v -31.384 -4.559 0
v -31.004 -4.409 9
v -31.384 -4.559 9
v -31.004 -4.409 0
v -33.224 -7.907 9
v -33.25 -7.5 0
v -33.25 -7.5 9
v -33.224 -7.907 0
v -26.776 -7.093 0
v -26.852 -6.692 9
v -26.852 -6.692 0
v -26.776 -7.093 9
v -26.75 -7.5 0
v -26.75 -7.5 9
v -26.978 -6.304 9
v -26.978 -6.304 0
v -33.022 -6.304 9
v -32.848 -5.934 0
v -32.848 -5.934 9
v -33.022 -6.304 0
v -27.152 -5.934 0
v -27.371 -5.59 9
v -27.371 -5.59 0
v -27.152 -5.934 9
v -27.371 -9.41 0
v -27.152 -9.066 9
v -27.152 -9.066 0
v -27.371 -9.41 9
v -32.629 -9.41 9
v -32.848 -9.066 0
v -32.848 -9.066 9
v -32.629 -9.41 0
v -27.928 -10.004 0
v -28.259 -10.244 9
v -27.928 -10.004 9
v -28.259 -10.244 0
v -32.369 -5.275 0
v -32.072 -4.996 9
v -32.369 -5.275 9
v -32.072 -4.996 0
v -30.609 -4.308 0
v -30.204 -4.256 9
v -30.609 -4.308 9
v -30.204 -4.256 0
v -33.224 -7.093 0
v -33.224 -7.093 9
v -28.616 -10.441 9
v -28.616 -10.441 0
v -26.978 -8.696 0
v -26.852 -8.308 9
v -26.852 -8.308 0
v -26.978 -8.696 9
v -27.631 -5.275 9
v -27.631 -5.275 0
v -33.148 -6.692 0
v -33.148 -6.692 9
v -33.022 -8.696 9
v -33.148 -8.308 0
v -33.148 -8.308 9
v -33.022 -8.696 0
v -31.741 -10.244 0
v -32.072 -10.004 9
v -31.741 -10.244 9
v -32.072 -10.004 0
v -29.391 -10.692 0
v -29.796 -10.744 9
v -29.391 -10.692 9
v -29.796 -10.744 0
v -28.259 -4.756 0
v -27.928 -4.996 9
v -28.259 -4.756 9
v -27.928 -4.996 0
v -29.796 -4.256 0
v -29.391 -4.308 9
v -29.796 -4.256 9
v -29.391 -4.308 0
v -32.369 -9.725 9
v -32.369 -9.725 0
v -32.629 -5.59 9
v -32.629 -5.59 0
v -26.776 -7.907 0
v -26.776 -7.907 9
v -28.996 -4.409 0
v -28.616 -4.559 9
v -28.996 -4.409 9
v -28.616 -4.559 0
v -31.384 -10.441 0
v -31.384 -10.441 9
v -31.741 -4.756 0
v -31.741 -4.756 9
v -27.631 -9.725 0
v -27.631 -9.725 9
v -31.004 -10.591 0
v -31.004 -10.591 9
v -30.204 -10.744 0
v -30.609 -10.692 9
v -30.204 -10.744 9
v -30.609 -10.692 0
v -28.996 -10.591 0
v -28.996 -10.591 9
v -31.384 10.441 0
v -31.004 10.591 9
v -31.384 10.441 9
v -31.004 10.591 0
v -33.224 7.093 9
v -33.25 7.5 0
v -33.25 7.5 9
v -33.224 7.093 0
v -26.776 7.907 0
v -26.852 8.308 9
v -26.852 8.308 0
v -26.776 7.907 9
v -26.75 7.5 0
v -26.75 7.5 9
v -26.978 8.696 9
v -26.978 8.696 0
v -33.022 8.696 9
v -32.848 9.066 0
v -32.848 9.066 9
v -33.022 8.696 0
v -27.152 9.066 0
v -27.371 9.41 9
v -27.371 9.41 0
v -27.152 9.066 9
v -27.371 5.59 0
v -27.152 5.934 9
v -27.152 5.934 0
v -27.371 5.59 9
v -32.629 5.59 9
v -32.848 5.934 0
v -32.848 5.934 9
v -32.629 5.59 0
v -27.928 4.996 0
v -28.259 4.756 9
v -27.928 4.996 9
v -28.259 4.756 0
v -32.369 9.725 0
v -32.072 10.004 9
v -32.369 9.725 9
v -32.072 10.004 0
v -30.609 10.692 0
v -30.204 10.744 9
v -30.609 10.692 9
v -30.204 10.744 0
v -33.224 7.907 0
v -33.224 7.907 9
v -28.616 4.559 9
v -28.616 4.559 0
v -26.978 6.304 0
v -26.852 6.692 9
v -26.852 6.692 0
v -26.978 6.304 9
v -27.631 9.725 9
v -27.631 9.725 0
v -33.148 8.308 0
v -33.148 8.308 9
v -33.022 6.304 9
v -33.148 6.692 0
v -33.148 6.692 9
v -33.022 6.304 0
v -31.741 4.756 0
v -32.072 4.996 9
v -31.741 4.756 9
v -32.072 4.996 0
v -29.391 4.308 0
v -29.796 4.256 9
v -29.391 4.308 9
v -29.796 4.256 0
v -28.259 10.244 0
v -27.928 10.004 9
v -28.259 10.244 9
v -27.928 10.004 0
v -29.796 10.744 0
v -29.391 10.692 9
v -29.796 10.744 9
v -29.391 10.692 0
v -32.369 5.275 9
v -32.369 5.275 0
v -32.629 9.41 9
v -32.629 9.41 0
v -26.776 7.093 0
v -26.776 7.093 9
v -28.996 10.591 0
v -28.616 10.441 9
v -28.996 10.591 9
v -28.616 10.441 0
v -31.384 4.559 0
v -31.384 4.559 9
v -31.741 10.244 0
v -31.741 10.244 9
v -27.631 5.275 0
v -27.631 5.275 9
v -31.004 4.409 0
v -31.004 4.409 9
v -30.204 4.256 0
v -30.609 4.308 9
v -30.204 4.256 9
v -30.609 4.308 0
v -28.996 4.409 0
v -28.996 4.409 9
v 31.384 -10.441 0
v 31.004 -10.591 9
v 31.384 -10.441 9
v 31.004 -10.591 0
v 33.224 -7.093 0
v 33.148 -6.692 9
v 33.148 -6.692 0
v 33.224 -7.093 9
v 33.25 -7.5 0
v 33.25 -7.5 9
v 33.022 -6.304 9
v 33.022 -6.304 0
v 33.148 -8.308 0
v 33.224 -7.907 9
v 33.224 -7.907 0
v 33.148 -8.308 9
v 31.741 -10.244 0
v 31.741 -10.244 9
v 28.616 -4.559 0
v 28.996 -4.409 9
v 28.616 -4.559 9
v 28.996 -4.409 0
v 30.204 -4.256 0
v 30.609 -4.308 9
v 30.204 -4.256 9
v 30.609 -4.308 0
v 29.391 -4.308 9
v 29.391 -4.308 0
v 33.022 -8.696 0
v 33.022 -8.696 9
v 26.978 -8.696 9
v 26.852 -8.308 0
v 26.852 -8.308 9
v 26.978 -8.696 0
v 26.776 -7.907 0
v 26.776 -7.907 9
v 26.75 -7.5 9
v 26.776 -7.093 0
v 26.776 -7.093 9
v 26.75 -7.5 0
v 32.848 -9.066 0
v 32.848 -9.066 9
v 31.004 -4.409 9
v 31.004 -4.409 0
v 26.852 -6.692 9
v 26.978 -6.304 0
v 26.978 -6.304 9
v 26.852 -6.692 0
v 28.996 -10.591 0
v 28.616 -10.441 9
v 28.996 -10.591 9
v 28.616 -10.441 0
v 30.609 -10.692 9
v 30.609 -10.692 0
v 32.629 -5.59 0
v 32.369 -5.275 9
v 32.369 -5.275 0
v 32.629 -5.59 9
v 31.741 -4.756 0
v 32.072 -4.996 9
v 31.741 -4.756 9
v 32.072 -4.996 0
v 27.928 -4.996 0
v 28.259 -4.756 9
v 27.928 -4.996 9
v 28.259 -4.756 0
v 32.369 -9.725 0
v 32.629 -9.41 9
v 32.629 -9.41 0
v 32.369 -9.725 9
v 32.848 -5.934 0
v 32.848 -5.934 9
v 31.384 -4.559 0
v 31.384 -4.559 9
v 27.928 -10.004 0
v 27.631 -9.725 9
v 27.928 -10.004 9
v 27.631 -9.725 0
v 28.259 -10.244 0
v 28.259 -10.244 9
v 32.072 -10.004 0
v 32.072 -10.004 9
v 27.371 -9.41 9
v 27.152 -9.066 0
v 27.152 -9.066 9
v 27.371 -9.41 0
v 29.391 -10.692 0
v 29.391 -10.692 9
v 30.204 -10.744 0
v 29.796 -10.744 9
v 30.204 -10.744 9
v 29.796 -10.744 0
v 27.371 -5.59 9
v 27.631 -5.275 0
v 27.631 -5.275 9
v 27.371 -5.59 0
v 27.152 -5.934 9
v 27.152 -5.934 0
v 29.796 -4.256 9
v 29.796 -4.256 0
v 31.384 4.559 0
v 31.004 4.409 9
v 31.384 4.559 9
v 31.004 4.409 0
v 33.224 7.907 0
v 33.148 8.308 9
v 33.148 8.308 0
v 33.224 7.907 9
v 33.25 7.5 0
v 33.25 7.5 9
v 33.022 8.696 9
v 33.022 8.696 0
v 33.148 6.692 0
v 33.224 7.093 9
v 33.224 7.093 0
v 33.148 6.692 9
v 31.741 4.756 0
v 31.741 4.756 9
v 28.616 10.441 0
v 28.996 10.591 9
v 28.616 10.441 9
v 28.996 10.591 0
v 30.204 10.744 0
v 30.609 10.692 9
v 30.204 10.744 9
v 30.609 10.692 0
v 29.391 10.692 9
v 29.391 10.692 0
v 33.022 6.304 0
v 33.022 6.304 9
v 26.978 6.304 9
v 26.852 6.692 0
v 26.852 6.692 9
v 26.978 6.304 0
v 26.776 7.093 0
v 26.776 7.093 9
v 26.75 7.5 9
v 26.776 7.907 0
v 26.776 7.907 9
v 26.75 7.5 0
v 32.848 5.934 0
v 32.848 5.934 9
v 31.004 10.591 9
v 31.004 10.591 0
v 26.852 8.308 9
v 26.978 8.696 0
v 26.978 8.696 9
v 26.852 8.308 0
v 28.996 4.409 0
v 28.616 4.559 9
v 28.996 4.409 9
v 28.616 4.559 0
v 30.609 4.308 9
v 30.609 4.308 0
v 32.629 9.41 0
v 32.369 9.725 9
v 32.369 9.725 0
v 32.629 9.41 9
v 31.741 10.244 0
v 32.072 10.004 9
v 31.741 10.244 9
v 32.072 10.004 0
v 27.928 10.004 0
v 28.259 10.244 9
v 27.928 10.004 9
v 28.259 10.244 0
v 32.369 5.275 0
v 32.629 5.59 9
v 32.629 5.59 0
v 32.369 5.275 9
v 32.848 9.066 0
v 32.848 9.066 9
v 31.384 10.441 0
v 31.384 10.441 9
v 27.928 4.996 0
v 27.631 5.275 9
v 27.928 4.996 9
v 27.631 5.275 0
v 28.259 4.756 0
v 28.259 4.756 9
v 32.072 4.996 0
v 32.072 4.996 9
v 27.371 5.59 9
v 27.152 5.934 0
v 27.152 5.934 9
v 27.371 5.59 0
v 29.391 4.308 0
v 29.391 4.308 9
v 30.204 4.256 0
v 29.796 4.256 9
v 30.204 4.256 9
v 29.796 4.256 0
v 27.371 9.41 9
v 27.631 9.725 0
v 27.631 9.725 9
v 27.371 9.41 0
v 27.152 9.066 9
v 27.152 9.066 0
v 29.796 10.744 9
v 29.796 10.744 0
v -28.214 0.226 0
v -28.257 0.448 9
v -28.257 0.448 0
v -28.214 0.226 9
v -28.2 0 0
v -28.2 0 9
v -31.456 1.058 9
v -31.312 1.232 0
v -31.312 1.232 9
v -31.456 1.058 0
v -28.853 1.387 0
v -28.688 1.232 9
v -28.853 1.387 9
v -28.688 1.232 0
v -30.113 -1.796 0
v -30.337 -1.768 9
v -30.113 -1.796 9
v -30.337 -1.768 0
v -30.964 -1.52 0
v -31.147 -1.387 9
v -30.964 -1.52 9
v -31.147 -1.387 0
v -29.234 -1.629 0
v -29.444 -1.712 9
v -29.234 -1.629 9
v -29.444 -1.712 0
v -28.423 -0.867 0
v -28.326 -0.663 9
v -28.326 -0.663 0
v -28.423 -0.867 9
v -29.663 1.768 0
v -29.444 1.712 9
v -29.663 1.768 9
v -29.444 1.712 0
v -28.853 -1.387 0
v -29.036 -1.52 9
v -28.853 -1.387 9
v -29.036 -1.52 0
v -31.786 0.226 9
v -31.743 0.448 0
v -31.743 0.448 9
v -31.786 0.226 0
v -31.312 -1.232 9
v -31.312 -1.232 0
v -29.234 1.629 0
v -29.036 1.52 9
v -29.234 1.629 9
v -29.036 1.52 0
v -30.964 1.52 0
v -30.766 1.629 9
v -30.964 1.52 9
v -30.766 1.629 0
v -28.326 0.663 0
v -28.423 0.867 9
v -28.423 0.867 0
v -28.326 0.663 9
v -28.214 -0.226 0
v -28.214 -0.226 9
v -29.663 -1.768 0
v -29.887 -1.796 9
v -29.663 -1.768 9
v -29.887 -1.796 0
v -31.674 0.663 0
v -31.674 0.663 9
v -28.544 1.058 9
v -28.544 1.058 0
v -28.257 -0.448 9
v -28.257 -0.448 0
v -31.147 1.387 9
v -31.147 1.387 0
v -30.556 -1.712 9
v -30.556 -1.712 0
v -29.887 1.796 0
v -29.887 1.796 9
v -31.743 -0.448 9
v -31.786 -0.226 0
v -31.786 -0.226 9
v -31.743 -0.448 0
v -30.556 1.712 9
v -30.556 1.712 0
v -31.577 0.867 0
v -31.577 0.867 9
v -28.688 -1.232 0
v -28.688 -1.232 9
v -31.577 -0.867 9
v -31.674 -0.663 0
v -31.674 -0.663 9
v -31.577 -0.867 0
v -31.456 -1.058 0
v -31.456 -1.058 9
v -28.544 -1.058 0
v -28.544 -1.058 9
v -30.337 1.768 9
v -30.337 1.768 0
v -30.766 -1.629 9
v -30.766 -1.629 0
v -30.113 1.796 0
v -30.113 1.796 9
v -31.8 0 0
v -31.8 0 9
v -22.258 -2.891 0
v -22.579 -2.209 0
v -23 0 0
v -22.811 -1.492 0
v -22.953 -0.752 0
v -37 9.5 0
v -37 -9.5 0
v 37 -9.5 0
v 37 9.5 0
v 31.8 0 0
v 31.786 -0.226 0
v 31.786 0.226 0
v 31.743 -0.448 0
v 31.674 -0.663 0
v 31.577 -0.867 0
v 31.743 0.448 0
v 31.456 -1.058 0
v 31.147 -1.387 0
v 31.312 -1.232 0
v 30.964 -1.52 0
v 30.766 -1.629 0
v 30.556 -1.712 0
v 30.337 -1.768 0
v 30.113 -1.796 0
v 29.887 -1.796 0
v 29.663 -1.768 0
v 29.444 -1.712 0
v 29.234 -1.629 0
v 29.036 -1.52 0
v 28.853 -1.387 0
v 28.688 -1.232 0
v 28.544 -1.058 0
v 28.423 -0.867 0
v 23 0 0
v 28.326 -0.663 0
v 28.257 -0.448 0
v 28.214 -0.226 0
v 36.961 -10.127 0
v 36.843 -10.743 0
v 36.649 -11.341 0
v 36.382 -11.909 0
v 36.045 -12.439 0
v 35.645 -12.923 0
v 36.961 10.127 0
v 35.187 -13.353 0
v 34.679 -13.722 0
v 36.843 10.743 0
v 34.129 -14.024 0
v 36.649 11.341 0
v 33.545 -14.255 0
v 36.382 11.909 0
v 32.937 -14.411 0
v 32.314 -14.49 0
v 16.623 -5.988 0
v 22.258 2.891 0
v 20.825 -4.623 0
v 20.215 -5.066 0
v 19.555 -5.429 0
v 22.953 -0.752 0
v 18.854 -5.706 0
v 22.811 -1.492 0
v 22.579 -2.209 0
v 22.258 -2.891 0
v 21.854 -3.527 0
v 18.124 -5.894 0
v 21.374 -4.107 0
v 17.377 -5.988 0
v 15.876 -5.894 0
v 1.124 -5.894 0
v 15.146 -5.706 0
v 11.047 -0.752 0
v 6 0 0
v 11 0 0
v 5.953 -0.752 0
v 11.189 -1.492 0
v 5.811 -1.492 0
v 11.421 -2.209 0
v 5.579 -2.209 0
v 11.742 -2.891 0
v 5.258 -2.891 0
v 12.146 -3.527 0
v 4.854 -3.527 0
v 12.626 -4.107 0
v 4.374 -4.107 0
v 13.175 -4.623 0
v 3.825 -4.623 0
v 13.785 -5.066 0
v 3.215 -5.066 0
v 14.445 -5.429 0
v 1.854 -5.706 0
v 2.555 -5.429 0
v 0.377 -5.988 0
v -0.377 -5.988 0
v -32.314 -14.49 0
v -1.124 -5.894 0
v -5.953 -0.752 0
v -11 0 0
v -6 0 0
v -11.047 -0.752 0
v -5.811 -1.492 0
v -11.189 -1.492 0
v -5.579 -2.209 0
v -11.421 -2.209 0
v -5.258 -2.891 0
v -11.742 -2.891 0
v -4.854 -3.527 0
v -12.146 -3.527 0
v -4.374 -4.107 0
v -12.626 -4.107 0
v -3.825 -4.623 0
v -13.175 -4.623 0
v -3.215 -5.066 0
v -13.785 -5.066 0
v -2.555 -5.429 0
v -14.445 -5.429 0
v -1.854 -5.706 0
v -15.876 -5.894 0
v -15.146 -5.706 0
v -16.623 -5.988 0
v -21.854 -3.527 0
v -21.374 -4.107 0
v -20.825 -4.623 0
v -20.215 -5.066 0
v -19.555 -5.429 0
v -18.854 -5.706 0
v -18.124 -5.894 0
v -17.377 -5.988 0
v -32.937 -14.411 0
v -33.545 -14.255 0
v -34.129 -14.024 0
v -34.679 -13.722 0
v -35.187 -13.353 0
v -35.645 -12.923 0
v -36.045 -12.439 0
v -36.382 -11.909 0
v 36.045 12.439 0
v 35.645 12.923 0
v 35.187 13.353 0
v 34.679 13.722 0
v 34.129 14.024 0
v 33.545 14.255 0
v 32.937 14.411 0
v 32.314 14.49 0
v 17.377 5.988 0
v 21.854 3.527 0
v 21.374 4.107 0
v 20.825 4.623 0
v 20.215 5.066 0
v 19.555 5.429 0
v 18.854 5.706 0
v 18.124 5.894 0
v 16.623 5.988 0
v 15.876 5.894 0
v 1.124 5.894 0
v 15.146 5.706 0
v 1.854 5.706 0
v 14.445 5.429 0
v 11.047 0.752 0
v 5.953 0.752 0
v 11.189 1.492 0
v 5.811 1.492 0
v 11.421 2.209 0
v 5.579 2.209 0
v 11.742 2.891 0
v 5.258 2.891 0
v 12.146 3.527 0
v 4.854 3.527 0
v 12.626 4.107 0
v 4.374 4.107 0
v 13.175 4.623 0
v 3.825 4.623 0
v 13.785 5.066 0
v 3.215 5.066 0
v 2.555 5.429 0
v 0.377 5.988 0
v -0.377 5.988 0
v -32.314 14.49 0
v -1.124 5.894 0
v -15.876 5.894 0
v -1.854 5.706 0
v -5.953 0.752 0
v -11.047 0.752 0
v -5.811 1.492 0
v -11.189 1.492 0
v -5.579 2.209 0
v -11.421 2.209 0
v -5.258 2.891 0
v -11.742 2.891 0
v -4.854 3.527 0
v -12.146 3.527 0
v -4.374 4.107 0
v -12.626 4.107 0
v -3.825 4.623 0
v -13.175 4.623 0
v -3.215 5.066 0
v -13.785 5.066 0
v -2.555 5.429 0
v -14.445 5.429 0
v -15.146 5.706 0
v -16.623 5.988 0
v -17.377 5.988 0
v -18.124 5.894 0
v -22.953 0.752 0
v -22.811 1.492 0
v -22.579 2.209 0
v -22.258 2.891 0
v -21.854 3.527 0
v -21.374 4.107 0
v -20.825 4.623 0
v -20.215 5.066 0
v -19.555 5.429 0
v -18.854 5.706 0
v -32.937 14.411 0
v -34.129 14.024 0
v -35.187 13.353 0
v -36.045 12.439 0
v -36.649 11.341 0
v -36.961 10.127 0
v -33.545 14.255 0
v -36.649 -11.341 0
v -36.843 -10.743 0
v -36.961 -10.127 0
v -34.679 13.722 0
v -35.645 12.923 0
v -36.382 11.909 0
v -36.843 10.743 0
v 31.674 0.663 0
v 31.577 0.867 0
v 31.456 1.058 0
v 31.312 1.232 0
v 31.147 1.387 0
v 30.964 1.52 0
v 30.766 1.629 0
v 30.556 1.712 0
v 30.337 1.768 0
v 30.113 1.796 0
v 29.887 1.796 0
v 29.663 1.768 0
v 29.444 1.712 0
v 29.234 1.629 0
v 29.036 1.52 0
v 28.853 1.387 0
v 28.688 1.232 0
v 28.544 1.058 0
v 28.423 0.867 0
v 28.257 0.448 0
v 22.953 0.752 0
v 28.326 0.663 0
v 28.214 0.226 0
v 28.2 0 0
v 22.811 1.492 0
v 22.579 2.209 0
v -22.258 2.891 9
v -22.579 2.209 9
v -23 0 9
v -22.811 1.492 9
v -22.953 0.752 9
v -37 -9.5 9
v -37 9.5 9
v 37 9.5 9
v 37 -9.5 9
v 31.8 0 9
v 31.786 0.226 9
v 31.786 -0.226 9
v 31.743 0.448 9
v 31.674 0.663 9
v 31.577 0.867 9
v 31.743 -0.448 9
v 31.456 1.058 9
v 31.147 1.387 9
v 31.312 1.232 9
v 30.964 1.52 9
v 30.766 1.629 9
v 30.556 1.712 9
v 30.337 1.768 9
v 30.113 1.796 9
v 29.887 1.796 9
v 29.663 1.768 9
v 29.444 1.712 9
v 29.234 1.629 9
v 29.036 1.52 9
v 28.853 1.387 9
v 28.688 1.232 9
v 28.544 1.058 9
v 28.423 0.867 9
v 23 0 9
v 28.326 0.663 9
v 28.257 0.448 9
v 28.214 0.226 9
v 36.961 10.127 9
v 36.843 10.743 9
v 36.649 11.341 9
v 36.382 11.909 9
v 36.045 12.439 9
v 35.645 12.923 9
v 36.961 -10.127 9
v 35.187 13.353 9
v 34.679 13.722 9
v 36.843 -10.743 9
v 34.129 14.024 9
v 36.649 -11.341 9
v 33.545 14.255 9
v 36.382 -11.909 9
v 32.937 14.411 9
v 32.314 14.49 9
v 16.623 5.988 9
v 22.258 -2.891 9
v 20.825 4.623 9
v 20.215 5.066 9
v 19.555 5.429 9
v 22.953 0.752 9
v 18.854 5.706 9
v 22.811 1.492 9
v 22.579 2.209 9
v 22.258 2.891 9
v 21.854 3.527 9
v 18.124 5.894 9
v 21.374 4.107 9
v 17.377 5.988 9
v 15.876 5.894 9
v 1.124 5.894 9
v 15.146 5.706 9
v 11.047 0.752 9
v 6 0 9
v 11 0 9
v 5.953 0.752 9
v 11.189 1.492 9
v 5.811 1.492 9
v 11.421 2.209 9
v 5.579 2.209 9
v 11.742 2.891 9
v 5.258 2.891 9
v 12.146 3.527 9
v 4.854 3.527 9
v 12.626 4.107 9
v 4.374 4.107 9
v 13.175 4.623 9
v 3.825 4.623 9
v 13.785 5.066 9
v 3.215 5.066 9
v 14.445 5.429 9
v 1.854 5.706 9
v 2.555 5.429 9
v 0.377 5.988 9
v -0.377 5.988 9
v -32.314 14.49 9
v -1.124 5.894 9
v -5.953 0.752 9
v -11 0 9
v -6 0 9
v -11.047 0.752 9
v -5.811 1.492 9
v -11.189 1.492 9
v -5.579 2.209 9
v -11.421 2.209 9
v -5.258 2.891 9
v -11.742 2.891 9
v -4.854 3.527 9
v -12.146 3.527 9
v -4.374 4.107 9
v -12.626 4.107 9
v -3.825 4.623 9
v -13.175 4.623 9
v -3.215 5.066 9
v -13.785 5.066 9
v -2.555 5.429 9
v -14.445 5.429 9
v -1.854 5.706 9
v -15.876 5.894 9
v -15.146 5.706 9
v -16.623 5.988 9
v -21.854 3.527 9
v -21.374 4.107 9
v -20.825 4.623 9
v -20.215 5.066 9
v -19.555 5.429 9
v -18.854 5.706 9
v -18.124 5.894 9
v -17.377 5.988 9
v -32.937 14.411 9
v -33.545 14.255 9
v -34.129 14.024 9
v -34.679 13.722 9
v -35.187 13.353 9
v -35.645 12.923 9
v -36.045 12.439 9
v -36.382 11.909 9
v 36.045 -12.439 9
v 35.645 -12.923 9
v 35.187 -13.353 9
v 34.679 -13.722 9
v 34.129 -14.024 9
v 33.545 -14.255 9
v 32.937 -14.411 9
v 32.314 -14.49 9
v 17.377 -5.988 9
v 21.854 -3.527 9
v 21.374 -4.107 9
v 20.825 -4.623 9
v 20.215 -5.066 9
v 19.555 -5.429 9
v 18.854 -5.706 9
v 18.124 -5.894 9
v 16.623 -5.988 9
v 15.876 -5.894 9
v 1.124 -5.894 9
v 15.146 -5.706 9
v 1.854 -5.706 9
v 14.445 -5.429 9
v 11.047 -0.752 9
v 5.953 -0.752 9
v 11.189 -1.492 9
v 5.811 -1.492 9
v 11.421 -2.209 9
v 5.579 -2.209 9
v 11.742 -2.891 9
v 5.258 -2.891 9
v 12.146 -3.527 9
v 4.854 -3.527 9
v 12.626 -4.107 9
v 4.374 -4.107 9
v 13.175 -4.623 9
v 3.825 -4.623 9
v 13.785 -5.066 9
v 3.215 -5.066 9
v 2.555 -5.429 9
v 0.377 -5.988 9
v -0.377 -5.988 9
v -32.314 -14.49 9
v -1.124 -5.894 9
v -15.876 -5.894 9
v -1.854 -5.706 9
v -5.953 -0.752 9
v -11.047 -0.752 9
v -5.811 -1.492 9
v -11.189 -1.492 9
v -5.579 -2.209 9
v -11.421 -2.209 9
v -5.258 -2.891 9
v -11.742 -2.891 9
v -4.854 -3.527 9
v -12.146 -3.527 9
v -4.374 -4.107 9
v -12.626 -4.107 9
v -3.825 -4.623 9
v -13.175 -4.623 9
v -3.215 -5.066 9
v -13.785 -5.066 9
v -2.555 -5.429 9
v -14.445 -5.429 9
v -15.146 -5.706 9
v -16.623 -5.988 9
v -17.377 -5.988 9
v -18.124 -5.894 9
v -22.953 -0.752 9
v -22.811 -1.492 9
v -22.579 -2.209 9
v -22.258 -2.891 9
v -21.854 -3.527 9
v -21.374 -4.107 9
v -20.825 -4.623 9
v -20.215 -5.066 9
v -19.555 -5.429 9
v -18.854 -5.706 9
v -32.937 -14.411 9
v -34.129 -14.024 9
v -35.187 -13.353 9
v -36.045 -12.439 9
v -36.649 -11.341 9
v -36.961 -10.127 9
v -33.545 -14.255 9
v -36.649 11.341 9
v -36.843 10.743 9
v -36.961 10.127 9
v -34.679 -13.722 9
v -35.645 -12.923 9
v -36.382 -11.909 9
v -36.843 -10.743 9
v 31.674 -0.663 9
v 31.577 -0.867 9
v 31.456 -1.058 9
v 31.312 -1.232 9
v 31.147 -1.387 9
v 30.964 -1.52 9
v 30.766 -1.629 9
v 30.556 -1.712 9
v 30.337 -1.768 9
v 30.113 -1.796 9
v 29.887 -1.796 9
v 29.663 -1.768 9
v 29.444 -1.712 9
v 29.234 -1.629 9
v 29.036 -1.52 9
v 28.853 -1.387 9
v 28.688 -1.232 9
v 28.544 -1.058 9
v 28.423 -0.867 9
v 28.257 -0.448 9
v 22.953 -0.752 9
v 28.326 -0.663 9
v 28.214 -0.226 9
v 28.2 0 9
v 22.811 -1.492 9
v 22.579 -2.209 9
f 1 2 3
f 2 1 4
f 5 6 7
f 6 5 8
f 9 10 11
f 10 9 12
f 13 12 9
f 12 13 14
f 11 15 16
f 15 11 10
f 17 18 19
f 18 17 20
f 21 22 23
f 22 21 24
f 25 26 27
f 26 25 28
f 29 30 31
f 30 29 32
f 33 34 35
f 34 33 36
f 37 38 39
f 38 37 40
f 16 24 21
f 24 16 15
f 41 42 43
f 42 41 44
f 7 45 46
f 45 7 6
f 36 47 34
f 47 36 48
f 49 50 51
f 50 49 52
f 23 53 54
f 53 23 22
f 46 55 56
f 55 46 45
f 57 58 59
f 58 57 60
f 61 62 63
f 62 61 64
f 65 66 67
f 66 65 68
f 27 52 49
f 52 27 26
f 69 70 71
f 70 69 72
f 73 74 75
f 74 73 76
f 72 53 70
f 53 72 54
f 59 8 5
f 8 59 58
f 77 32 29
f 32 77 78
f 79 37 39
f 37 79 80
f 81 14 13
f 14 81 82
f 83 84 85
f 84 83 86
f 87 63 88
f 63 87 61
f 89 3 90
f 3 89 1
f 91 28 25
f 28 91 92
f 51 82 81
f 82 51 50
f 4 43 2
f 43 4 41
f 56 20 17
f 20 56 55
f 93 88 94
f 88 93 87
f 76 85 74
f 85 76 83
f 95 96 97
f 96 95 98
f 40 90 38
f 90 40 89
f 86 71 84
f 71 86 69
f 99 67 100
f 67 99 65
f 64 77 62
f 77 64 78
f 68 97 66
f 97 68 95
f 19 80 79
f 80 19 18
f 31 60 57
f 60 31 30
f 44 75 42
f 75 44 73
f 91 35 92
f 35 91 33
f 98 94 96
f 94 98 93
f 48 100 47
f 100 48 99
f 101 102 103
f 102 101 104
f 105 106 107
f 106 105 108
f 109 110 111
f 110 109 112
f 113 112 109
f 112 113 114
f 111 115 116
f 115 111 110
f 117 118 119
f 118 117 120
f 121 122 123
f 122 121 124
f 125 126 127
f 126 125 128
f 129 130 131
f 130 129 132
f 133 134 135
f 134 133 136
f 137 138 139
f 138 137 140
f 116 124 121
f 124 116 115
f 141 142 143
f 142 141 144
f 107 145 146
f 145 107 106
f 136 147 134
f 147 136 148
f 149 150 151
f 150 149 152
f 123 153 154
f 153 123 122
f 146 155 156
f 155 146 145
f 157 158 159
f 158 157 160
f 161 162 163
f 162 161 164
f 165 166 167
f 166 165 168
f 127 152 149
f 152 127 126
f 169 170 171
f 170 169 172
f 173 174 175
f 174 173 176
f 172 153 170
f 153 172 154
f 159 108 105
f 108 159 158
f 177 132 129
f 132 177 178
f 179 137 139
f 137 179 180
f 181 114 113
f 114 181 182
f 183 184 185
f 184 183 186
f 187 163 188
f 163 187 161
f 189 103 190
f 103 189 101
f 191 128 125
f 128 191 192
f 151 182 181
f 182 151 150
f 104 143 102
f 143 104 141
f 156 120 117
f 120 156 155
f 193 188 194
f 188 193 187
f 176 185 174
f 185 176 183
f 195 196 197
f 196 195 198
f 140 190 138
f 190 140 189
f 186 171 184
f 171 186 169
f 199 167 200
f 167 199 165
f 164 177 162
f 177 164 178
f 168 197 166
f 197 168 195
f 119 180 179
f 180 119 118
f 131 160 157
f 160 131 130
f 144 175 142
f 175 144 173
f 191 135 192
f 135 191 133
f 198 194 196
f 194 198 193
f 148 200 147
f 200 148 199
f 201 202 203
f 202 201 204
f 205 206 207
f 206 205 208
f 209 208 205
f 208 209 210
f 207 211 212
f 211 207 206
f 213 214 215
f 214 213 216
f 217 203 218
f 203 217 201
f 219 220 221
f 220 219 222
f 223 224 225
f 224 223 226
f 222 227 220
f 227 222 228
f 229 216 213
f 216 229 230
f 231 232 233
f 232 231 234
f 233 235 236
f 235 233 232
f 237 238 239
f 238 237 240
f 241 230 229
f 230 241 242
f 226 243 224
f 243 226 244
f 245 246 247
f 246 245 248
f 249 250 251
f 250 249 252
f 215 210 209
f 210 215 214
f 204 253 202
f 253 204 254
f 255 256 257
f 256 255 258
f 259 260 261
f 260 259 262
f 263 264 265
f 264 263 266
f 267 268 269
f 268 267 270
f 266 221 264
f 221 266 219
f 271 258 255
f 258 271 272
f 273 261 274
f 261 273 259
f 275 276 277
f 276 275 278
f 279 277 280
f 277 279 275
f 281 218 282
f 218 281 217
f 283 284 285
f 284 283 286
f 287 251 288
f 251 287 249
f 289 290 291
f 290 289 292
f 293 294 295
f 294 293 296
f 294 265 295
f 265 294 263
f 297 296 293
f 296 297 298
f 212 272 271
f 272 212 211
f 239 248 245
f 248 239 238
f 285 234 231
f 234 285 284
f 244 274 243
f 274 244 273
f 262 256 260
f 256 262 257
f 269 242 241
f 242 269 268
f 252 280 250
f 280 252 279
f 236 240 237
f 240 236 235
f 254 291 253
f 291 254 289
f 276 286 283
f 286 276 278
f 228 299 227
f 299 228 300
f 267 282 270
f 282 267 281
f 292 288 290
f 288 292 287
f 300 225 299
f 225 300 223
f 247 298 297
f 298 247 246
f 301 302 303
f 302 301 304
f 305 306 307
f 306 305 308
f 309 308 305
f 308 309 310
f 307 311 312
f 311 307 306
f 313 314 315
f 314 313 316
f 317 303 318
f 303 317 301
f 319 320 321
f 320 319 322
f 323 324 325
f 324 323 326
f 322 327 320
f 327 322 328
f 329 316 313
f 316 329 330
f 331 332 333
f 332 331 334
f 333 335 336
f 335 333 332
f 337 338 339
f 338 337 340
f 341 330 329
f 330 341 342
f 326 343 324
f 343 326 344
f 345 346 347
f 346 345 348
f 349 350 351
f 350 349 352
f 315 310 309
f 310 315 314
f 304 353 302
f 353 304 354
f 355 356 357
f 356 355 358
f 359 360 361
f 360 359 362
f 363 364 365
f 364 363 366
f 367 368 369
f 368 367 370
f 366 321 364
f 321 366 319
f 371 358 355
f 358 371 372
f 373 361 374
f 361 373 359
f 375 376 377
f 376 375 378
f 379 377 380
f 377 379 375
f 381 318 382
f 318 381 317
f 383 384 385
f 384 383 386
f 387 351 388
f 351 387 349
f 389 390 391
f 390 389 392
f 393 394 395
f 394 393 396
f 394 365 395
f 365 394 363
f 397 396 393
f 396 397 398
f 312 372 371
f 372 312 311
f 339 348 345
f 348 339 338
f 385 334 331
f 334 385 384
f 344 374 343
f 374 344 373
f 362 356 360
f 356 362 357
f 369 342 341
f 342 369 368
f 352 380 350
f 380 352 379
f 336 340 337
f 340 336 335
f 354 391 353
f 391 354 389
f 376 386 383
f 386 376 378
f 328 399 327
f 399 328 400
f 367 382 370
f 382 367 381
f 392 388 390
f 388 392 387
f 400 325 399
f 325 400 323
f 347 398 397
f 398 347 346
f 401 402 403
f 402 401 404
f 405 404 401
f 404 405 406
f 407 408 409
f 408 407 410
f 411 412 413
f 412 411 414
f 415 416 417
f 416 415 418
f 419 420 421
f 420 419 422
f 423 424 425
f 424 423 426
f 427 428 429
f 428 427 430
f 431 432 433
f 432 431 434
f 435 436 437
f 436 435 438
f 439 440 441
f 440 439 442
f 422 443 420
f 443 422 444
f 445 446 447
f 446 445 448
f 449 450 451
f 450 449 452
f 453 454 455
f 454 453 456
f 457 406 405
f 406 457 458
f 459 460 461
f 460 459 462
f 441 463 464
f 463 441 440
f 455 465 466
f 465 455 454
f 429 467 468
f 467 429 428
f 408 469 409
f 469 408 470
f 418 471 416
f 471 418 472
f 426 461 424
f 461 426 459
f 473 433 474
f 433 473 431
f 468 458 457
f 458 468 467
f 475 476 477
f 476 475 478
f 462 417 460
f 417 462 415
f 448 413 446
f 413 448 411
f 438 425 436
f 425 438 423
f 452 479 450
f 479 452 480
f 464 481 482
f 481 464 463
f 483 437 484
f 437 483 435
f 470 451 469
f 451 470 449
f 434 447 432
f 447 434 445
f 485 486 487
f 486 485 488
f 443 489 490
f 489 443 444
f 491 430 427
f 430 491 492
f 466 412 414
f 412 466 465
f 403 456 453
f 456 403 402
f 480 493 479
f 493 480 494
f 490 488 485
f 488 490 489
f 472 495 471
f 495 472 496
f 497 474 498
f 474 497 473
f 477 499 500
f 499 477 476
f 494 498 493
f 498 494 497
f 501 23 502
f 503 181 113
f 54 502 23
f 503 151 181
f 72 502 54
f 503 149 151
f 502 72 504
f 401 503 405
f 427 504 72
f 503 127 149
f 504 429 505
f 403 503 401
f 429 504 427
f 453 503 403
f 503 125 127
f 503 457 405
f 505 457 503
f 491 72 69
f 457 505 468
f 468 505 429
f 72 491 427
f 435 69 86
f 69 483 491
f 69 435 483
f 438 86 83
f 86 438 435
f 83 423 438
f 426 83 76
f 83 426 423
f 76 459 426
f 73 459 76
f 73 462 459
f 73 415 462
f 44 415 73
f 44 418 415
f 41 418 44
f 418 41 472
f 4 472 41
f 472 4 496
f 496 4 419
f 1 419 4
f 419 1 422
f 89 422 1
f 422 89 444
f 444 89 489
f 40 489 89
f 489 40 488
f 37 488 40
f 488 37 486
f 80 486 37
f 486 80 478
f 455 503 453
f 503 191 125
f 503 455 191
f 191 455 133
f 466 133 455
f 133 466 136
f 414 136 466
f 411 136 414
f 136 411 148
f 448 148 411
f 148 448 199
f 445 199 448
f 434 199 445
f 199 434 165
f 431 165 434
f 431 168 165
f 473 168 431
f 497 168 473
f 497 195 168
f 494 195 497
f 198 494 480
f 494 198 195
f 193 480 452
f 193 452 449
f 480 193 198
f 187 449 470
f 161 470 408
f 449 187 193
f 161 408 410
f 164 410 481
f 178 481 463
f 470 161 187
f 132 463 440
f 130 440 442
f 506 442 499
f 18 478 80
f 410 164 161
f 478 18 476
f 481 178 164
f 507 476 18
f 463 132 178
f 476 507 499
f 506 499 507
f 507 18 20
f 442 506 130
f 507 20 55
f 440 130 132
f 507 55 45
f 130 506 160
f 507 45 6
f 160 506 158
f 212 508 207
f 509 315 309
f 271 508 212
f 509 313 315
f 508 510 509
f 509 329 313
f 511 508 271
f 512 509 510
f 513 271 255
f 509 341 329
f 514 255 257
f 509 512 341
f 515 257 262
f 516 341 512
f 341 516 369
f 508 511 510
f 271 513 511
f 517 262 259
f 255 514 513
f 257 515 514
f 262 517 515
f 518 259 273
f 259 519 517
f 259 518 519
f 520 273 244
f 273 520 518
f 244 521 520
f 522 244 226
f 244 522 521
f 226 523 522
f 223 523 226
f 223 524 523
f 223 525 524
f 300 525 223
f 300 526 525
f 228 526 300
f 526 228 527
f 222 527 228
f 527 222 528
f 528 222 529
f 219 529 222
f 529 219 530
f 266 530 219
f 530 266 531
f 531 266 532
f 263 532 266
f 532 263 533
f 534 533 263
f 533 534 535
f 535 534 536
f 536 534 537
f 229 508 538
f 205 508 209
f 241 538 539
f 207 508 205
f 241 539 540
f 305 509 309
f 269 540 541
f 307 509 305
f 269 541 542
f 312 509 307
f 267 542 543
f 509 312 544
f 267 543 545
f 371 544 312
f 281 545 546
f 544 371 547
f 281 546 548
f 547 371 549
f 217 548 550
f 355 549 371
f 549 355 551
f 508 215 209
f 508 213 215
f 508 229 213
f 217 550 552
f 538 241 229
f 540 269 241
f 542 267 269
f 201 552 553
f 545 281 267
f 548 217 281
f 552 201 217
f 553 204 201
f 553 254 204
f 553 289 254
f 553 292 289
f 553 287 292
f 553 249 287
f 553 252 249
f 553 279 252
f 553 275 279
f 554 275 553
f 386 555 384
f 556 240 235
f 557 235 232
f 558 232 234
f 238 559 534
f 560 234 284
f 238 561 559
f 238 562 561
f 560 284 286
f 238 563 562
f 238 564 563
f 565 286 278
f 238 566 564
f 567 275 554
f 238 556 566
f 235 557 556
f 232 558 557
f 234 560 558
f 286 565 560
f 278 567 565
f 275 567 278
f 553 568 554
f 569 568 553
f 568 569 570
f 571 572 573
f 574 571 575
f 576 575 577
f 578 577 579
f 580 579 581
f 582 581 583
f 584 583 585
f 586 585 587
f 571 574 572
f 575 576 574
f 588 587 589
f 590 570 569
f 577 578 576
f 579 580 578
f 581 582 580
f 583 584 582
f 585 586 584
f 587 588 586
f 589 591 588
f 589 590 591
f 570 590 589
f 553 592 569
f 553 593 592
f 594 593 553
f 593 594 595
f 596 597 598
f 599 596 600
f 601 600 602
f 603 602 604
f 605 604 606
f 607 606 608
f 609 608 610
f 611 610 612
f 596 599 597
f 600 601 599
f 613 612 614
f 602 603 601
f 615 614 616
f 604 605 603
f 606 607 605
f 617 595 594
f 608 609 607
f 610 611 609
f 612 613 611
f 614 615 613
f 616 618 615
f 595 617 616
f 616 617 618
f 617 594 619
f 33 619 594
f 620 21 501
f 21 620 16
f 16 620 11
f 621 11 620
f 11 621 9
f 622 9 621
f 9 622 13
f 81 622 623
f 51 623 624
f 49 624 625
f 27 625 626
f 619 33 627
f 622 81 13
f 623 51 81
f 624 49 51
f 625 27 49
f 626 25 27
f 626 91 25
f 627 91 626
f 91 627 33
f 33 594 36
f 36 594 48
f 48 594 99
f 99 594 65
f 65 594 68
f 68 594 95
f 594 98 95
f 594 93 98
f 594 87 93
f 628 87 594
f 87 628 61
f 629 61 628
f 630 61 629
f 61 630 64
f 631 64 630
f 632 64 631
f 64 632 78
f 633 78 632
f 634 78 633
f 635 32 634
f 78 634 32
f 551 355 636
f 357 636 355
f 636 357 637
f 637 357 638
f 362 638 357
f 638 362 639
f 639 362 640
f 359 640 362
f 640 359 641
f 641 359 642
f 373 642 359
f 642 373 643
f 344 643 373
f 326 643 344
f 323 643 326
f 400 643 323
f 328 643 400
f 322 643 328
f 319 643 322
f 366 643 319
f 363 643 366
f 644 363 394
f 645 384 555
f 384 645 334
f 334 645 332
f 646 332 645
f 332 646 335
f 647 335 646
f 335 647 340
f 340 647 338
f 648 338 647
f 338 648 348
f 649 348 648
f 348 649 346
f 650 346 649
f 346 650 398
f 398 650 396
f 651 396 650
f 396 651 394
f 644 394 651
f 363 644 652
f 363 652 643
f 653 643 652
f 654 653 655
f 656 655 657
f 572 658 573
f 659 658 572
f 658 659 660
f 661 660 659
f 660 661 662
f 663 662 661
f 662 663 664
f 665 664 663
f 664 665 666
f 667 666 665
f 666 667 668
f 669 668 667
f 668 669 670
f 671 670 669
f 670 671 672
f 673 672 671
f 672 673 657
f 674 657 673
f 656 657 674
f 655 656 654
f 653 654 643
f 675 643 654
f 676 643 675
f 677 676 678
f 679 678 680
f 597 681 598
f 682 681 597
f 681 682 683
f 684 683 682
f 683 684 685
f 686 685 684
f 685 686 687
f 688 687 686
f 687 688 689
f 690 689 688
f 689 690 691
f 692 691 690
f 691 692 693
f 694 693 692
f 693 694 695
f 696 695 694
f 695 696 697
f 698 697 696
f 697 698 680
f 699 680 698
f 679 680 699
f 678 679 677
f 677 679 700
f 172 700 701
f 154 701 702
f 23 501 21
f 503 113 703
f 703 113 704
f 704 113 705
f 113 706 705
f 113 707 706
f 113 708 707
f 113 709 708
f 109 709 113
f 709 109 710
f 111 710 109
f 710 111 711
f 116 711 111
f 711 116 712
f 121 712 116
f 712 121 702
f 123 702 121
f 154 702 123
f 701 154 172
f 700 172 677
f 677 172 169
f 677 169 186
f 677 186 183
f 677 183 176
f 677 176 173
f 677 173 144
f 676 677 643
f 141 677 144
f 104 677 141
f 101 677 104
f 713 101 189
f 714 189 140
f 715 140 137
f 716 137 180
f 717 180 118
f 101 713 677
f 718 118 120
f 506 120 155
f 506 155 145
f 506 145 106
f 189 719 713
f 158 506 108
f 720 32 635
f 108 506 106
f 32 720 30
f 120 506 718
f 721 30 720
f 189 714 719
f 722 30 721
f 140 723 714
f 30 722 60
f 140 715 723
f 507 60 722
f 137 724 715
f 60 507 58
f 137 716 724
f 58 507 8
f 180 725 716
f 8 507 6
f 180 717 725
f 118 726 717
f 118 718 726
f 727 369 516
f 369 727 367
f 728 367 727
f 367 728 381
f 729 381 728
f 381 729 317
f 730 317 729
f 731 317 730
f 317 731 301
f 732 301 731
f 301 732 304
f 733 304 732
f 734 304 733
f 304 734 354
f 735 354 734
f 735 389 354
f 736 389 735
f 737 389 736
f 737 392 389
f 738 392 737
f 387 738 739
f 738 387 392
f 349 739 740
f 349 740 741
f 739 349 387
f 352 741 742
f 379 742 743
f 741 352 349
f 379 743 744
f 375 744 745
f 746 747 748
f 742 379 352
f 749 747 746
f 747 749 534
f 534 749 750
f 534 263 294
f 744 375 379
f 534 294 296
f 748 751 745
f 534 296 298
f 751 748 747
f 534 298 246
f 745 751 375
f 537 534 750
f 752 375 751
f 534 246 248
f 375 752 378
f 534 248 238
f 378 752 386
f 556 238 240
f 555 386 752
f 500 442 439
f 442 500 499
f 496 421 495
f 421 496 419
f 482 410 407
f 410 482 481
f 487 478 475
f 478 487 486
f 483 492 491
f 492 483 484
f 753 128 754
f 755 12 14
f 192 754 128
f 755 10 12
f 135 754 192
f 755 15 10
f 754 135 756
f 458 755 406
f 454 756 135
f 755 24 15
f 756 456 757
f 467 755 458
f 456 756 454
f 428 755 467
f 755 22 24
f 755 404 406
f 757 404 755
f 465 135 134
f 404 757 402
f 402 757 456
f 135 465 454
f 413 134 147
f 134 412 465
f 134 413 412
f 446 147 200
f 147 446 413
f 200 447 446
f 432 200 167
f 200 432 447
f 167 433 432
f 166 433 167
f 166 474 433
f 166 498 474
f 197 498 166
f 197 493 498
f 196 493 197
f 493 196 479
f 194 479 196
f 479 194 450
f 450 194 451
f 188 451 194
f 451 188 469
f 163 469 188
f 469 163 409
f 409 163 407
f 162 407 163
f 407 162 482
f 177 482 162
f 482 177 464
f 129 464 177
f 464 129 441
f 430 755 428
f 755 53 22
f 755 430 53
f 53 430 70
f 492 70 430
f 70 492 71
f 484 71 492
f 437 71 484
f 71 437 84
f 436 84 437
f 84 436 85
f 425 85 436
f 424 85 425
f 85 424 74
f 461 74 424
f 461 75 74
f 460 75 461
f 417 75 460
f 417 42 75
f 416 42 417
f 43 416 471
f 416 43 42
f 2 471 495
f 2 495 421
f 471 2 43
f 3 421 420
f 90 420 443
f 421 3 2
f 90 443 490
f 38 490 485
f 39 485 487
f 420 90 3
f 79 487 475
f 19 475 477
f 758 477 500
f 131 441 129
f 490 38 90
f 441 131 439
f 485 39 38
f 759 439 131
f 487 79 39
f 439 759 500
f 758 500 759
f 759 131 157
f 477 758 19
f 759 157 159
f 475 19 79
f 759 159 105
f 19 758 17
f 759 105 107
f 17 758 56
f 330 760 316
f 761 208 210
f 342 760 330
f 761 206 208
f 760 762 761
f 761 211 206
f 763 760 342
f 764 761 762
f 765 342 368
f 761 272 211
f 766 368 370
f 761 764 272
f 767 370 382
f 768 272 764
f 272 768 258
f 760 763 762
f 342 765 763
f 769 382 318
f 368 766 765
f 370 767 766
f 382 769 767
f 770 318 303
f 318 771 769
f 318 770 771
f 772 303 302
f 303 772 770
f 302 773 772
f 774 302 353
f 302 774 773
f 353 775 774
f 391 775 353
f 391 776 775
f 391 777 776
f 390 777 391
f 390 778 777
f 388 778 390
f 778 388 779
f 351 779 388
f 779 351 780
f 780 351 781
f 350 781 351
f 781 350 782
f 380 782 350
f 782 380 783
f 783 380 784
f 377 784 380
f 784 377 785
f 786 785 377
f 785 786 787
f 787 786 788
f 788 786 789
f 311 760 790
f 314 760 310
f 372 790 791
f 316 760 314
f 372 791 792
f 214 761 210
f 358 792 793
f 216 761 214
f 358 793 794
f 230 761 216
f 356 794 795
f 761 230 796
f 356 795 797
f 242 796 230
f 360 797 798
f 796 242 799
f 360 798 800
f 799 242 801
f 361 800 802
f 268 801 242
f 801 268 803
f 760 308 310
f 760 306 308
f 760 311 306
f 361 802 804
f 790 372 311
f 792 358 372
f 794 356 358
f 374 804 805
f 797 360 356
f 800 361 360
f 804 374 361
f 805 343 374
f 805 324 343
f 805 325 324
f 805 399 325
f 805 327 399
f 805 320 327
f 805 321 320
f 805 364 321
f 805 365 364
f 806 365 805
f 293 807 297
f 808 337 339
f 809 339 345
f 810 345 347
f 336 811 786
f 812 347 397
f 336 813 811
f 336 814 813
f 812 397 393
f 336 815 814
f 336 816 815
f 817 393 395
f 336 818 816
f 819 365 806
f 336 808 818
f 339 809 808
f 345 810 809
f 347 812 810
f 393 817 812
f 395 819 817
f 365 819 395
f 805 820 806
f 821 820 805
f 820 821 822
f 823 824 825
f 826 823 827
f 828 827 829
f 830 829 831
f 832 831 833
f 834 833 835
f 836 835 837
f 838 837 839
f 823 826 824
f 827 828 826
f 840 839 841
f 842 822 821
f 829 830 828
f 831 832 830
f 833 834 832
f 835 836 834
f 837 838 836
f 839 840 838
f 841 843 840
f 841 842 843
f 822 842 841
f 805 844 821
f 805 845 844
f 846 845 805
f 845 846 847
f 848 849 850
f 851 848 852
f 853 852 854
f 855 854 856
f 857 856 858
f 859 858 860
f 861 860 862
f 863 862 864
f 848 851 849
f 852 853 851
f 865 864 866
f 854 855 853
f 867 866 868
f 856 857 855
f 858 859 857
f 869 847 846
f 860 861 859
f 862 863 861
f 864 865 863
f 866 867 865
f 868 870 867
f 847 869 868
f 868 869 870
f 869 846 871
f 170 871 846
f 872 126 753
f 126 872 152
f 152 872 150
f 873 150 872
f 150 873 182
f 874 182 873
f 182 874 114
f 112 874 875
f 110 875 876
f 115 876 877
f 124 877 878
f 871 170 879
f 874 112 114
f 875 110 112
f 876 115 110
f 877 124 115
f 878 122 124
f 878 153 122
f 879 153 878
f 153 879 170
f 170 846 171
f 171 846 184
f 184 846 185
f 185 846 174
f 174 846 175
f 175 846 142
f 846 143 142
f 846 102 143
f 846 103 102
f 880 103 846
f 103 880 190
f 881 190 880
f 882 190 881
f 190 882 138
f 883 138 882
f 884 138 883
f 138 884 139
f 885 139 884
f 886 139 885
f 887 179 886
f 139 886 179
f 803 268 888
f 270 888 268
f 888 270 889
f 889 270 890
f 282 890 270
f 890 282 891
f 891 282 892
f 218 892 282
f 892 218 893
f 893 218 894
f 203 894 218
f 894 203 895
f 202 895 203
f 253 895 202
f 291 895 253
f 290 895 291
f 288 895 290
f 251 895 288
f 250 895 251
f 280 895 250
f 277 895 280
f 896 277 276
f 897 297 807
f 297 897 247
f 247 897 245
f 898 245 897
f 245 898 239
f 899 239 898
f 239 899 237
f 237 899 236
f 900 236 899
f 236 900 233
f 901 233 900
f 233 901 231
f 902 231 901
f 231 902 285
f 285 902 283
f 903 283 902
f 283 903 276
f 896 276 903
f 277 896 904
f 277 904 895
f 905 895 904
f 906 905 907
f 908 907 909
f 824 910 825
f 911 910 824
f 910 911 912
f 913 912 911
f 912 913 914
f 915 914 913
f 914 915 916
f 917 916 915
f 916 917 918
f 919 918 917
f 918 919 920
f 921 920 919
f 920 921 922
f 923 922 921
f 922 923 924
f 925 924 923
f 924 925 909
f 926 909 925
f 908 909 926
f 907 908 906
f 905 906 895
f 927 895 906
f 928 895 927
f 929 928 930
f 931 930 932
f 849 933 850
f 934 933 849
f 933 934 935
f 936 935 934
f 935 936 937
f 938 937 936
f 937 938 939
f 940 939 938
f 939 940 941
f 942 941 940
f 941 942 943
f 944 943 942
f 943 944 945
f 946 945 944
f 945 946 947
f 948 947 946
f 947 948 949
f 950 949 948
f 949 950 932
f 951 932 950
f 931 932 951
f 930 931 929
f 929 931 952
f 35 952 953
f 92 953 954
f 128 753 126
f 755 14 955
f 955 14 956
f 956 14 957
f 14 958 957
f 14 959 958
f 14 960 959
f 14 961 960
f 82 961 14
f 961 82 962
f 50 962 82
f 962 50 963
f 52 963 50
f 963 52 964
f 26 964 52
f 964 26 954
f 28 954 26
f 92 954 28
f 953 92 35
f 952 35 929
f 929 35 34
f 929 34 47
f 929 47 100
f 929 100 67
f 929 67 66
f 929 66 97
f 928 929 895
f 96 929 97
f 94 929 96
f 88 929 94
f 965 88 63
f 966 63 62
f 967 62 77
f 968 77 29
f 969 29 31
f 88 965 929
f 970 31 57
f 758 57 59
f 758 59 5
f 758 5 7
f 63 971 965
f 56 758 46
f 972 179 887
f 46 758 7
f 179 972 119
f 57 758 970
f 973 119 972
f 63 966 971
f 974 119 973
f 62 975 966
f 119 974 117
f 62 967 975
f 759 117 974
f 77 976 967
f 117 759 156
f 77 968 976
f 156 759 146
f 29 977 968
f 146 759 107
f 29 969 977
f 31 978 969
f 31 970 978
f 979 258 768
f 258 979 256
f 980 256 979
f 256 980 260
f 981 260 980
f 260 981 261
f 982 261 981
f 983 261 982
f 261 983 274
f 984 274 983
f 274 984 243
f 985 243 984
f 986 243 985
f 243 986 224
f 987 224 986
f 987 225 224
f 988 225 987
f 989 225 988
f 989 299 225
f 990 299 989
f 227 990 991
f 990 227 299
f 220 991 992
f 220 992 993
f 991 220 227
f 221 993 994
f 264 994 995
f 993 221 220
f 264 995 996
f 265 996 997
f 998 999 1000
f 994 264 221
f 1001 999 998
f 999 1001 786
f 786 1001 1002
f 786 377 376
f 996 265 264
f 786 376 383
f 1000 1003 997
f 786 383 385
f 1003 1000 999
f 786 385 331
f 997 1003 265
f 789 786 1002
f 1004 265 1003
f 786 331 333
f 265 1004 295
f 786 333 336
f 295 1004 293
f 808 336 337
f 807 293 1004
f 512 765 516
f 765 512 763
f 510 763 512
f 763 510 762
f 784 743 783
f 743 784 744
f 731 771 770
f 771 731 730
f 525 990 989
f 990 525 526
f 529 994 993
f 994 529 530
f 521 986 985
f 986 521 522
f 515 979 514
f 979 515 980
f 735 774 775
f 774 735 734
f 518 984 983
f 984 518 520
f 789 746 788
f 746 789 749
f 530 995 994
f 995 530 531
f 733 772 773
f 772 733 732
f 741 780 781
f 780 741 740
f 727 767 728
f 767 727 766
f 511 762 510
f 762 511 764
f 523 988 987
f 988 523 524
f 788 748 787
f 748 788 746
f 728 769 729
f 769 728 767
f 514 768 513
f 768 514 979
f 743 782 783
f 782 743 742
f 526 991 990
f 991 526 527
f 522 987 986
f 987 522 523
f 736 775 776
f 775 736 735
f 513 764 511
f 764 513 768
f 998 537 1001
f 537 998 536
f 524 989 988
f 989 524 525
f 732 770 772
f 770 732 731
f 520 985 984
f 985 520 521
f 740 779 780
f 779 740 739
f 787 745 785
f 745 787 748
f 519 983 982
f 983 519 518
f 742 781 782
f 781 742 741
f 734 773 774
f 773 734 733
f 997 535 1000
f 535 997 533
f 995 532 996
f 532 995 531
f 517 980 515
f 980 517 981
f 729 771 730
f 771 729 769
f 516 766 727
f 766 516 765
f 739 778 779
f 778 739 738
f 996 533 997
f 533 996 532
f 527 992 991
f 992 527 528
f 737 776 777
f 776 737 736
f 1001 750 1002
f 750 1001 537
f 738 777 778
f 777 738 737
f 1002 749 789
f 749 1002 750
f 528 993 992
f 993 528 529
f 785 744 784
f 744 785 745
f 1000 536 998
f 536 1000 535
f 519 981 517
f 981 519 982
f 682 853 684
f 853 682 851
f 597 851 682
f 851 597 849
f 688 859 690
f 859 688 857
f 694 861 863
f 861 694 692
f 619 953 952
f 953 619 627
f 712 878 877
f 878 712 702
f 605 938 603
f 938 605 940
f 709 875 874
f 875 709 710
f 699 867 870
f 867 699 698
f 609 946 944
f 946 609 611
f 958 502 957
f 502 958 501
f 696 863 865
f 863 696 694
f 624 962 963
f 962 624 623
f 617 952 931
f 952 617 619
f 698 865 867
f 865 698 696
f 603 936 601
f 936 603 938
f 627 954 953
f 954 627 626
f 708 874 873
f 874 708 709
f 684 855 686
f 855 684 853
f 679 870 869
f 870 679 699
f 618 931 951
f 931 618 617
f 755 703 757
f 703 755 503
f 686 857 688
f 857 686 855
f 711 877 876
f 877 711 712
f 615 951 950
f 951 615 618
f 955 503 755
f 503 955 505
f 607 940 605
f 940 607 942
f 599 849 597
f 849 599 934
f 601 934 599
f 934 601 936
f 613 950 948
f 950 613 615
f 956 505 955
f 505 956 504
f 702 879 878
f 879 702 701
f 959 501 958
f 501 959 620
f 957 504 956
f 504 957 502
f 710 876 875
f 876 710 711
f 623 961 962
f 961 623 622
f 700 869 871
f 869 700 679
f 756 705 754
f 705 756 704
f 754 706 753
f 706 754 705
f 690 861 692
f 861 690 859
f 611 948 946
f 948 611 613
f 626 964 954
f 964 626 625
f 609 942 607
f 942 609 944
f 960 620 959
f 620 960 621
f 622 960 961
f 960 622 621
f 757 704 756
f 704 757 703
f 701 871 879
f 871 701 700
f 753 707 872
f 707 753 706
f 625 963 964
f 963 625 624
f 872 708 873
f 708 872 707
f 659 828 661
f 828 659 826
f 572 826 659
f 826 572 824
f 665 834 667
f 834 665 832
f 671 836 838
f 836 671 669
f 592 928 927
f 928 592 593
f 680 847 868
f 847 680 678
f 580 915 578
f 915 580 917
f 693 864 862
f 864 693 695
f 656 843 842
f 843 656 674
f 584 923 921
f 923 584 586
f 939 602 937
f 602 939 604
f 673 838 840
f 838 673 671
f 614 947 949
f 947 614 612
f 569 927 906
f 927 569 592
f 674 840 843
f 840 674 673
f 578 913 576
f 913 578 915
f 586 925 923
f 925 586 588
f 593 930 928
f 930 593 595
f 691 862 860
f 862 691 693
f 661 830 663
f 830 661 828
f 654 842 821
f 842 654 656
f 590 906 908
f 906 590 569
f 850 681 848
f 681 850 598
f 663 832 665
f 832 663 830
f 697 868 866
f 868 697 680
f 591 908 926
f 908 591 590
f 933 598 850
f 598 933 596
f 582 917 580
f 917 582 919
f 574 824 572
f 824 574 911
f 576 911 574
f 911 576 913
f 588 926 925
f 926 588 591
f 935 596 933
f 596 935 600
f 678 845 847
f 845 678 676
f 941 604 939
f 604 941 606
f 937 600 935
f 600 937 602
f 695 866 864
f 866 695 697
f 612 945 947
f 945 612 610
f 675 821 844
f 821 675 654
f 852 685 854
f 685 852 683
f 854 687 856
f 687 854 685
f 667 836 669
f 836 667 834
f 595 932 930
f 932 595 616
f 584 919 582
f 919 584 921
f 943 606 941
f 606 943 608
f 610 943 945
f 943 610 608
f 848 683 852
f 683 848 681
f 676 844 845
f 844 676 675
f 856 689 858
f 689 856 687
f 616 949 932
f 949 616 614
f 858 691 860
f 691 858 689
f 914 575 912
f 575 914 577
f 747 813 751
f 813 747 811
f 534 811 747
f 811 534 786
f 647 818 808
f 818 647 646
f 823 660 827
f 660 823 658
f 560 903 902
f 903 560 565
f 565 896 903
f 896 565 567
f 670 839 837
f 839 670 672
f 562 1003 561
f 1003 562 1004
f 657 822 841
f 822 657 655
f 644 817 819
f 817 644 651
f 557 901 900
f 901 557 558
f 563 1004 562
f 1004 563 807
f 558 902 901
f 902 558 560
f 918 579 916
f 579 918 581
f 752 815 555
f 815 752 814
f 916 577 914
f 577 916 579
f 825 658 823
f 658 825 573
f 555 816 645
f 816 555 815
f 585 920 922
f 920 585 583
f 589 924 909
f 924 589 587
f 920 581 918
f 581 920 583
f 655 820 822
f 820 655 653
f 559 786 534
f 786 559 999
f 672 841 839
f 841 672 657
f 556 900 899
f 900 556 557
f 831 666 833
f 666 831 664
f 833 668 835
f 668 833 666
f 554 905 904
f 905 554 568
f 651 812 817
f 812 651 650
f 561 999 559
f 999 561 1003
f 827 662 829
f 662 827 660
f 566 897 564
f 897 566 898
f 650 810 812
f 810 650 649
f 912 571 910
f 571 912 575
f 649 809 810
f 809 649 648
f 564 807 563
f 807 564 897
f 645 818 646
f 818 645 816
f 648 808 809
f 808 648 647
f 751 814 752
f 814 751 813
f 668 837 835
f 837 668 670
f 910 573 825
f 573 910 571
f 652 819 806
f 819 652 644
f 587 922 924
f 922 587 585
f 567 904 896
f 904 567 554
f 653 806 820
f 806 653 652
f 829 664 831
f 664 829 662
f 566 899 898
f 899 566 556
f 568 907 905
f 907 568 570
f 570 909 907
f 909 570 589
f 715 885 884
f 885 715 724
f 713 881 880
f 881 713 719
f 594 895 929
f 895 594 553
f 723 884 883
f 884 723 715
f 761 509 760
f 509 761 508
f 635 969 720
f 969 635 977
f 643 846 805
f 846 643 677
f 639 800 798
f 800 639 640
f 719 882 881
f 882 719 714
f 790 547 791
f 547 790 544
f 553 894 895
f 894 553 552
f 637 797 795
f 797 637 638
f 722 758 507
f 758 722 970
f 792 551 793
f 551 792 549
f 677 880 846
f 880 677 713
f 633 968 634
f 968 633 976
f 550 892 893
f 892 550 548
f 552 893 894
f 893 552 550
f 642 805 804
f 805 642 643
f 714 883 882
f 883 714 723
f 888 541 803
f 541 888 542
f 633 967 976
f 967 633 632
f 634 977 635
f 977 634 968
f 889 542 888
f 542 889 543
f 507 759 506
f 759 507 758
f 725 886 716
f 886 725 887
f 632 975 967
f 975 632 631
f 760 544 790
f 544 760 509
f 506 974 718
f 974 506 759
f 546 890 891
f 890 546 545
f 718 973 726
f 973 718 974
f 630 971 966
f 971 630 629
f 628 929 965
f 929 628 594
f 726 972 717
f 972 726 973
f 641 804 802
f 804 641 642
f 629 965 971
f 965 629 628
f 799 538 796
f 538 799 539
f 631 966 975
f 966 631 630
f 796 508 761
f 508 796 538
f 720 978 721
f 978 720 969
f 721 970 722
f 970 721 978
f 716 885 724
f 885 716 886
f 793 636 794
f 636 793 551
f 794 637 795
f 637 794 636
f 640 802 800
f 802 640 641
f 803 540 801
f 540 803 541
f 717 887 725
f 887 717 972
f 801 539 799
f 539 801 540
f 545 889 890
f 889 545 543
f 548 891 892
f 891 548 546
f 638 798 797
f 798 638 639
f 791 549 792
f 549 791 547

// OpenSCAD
$fn = 50;


difference() {
	union() {
		hull() {
			translate(v = [-32.0000000000, 9.5000000000, 0]) {
				cylinder(h = 9, r = 5);
			}
			translate(v = [32.0000000000, 9.5000000000, 0]) {
				cylinder(h = 9, r = 5);
			}
			translate(v = [-32.0000000000, -9.5000000000, 0]) {
				cylinder(h = 9, r = 5);
			}
			translate(v = [32.0000000000, -9.5000000000, 0]) {
				cylinder(h = 9, r = 5);
			}
		}
	}
	union() {
		#translate(v = [-30.0000000000, -7.5000000000, 0]) {
			cylinder(h = 9, r = 3.2500000000);
		}
		#translate(v = [-30.0000000000, 7.5000000000, 0]) {
			cylinder(h = 9, r = 3.2500000000);
		}
		#translate(v = [30.0000000000, -7.5000000000, 0]) {
			cylinder(h = 9, r = 3.2500000000);
		}
		#translate(v = [30.0000000000, 7.5000000000, 0]) {
			cylinder(h = 9, r = 3.2500000000);
		}
		#translate(v = [-30.0000000000, -7.5000000000, -100.0000000000]) {
			cylinder(h = 200, r = 3.2500000000);
		}
		#translate(v = [-30.0000000000, 7.5000000000, -100.0000000000]) {
			cylinder(h = 200, r = 3.2500000000);
		}
		#translate(v = [30.0000000000, -7.5000000000, -100.0000000000]) {
			cylinder(h = 200, r = 3.2500000000);
		}
		#translate(v = [30.0000000000, 7.5000000000, -100.0000000000]) {
			cylinder(h = 200, r = 3.2500000000);
		}
		#translate(v = [-30.0000000000, -7.5000000000, 0]) {
			cylinder(h = 9, r = 1.8000000000);
		}
		#translate(v = [-30.0000000000, 0.0000000000, 0]) {
			cylinder(h = 9, r = 1.8000000000);
		}
		#translate(v = [-30.0000000000, 7.5000000000, 0]) {
			cylinder(h = 9, r = 1.8000000000);
		}
		#translate(v = [30.0000000000, -7.5000000000, 0]) {
			cylinder(h = 9, r = 1.8000000000);
		}
		#translate(v = [30.0000000000, 0.0000000000, 0]) {
			cylinder(h = 9, r = 1.8000000000);
		}
		#translate(v = [30.0000000000, 7.5000000000, 0]) {
			cylinder(h = 9, r = 1.8000000000);
		}
		#translate(v = [-30.0000000000, -7.5000000000, 0]) {
			cylinder(h = 9, r = 1.8000000000);
		}
		#translate(v = [-30.0000000000, 0.0000000000, 0]) {
			cylinder(h = 9, r = 1.8000000000);
		}
		#translate(v = [-30.0000000000, 7.5000000000, 0]) {
			cylinder(h = 9, r = 1.8000000000);
		}
		#translate(v = [30.0000000000, -7.5000000000, 0]) {
			cylinder(h = 9, r = 1.8000000000);
		}
		#translate(v = [30.0000000000, 0.0000000000, 0]) {
			cylinder(h = 9, r = 1.8000000000);
		}
		#translate(v = [30.0000000000, 7.5000000000, 0]) {
			cylinder(h = 9, r = 1.8000000000);
		}
		#translate(v = [-30.0000000000, -7.5000000000, 0]) {
			cylinder(h = 9, r = 1.8000000000);
		}
		#translate(v = [-30.0000000000, 0.0000000000, 0]) {
			cylinder(h = 9, r = 1.8000000000);
		}
		#translate(v = [-30.0000000000, 7.5000000000, 0]) {
			cylinder(h = 9, r = 1.8000000000);
		}
		#translate(v = [30.0000000000, -7.5000000000, 0]) {
			cylinder(h = 9, r = 1.8000000000);
		}
		#translate(v = [30.0000000000, 0.0000000000, 0]) {
			cylinder(h = 9, r = 1.8000000000);
		}
		#translate(v = [30.0000000000, 7.5000000000, 0]) {
			cylinder(h = 9, r = 1.8000000000);
		}
		#translate(v = [-17.0000000000, 0, 0]) {
			cylinder(h = 9, r = 6.0000000000);
		}
		#cylinder(h = 9, r = 6.0000000000);
		#translate(v = [17.0000000000, 0, 0]) {
			cylinder(h = 9, r = 6.0000000000);
		}
	}
}
